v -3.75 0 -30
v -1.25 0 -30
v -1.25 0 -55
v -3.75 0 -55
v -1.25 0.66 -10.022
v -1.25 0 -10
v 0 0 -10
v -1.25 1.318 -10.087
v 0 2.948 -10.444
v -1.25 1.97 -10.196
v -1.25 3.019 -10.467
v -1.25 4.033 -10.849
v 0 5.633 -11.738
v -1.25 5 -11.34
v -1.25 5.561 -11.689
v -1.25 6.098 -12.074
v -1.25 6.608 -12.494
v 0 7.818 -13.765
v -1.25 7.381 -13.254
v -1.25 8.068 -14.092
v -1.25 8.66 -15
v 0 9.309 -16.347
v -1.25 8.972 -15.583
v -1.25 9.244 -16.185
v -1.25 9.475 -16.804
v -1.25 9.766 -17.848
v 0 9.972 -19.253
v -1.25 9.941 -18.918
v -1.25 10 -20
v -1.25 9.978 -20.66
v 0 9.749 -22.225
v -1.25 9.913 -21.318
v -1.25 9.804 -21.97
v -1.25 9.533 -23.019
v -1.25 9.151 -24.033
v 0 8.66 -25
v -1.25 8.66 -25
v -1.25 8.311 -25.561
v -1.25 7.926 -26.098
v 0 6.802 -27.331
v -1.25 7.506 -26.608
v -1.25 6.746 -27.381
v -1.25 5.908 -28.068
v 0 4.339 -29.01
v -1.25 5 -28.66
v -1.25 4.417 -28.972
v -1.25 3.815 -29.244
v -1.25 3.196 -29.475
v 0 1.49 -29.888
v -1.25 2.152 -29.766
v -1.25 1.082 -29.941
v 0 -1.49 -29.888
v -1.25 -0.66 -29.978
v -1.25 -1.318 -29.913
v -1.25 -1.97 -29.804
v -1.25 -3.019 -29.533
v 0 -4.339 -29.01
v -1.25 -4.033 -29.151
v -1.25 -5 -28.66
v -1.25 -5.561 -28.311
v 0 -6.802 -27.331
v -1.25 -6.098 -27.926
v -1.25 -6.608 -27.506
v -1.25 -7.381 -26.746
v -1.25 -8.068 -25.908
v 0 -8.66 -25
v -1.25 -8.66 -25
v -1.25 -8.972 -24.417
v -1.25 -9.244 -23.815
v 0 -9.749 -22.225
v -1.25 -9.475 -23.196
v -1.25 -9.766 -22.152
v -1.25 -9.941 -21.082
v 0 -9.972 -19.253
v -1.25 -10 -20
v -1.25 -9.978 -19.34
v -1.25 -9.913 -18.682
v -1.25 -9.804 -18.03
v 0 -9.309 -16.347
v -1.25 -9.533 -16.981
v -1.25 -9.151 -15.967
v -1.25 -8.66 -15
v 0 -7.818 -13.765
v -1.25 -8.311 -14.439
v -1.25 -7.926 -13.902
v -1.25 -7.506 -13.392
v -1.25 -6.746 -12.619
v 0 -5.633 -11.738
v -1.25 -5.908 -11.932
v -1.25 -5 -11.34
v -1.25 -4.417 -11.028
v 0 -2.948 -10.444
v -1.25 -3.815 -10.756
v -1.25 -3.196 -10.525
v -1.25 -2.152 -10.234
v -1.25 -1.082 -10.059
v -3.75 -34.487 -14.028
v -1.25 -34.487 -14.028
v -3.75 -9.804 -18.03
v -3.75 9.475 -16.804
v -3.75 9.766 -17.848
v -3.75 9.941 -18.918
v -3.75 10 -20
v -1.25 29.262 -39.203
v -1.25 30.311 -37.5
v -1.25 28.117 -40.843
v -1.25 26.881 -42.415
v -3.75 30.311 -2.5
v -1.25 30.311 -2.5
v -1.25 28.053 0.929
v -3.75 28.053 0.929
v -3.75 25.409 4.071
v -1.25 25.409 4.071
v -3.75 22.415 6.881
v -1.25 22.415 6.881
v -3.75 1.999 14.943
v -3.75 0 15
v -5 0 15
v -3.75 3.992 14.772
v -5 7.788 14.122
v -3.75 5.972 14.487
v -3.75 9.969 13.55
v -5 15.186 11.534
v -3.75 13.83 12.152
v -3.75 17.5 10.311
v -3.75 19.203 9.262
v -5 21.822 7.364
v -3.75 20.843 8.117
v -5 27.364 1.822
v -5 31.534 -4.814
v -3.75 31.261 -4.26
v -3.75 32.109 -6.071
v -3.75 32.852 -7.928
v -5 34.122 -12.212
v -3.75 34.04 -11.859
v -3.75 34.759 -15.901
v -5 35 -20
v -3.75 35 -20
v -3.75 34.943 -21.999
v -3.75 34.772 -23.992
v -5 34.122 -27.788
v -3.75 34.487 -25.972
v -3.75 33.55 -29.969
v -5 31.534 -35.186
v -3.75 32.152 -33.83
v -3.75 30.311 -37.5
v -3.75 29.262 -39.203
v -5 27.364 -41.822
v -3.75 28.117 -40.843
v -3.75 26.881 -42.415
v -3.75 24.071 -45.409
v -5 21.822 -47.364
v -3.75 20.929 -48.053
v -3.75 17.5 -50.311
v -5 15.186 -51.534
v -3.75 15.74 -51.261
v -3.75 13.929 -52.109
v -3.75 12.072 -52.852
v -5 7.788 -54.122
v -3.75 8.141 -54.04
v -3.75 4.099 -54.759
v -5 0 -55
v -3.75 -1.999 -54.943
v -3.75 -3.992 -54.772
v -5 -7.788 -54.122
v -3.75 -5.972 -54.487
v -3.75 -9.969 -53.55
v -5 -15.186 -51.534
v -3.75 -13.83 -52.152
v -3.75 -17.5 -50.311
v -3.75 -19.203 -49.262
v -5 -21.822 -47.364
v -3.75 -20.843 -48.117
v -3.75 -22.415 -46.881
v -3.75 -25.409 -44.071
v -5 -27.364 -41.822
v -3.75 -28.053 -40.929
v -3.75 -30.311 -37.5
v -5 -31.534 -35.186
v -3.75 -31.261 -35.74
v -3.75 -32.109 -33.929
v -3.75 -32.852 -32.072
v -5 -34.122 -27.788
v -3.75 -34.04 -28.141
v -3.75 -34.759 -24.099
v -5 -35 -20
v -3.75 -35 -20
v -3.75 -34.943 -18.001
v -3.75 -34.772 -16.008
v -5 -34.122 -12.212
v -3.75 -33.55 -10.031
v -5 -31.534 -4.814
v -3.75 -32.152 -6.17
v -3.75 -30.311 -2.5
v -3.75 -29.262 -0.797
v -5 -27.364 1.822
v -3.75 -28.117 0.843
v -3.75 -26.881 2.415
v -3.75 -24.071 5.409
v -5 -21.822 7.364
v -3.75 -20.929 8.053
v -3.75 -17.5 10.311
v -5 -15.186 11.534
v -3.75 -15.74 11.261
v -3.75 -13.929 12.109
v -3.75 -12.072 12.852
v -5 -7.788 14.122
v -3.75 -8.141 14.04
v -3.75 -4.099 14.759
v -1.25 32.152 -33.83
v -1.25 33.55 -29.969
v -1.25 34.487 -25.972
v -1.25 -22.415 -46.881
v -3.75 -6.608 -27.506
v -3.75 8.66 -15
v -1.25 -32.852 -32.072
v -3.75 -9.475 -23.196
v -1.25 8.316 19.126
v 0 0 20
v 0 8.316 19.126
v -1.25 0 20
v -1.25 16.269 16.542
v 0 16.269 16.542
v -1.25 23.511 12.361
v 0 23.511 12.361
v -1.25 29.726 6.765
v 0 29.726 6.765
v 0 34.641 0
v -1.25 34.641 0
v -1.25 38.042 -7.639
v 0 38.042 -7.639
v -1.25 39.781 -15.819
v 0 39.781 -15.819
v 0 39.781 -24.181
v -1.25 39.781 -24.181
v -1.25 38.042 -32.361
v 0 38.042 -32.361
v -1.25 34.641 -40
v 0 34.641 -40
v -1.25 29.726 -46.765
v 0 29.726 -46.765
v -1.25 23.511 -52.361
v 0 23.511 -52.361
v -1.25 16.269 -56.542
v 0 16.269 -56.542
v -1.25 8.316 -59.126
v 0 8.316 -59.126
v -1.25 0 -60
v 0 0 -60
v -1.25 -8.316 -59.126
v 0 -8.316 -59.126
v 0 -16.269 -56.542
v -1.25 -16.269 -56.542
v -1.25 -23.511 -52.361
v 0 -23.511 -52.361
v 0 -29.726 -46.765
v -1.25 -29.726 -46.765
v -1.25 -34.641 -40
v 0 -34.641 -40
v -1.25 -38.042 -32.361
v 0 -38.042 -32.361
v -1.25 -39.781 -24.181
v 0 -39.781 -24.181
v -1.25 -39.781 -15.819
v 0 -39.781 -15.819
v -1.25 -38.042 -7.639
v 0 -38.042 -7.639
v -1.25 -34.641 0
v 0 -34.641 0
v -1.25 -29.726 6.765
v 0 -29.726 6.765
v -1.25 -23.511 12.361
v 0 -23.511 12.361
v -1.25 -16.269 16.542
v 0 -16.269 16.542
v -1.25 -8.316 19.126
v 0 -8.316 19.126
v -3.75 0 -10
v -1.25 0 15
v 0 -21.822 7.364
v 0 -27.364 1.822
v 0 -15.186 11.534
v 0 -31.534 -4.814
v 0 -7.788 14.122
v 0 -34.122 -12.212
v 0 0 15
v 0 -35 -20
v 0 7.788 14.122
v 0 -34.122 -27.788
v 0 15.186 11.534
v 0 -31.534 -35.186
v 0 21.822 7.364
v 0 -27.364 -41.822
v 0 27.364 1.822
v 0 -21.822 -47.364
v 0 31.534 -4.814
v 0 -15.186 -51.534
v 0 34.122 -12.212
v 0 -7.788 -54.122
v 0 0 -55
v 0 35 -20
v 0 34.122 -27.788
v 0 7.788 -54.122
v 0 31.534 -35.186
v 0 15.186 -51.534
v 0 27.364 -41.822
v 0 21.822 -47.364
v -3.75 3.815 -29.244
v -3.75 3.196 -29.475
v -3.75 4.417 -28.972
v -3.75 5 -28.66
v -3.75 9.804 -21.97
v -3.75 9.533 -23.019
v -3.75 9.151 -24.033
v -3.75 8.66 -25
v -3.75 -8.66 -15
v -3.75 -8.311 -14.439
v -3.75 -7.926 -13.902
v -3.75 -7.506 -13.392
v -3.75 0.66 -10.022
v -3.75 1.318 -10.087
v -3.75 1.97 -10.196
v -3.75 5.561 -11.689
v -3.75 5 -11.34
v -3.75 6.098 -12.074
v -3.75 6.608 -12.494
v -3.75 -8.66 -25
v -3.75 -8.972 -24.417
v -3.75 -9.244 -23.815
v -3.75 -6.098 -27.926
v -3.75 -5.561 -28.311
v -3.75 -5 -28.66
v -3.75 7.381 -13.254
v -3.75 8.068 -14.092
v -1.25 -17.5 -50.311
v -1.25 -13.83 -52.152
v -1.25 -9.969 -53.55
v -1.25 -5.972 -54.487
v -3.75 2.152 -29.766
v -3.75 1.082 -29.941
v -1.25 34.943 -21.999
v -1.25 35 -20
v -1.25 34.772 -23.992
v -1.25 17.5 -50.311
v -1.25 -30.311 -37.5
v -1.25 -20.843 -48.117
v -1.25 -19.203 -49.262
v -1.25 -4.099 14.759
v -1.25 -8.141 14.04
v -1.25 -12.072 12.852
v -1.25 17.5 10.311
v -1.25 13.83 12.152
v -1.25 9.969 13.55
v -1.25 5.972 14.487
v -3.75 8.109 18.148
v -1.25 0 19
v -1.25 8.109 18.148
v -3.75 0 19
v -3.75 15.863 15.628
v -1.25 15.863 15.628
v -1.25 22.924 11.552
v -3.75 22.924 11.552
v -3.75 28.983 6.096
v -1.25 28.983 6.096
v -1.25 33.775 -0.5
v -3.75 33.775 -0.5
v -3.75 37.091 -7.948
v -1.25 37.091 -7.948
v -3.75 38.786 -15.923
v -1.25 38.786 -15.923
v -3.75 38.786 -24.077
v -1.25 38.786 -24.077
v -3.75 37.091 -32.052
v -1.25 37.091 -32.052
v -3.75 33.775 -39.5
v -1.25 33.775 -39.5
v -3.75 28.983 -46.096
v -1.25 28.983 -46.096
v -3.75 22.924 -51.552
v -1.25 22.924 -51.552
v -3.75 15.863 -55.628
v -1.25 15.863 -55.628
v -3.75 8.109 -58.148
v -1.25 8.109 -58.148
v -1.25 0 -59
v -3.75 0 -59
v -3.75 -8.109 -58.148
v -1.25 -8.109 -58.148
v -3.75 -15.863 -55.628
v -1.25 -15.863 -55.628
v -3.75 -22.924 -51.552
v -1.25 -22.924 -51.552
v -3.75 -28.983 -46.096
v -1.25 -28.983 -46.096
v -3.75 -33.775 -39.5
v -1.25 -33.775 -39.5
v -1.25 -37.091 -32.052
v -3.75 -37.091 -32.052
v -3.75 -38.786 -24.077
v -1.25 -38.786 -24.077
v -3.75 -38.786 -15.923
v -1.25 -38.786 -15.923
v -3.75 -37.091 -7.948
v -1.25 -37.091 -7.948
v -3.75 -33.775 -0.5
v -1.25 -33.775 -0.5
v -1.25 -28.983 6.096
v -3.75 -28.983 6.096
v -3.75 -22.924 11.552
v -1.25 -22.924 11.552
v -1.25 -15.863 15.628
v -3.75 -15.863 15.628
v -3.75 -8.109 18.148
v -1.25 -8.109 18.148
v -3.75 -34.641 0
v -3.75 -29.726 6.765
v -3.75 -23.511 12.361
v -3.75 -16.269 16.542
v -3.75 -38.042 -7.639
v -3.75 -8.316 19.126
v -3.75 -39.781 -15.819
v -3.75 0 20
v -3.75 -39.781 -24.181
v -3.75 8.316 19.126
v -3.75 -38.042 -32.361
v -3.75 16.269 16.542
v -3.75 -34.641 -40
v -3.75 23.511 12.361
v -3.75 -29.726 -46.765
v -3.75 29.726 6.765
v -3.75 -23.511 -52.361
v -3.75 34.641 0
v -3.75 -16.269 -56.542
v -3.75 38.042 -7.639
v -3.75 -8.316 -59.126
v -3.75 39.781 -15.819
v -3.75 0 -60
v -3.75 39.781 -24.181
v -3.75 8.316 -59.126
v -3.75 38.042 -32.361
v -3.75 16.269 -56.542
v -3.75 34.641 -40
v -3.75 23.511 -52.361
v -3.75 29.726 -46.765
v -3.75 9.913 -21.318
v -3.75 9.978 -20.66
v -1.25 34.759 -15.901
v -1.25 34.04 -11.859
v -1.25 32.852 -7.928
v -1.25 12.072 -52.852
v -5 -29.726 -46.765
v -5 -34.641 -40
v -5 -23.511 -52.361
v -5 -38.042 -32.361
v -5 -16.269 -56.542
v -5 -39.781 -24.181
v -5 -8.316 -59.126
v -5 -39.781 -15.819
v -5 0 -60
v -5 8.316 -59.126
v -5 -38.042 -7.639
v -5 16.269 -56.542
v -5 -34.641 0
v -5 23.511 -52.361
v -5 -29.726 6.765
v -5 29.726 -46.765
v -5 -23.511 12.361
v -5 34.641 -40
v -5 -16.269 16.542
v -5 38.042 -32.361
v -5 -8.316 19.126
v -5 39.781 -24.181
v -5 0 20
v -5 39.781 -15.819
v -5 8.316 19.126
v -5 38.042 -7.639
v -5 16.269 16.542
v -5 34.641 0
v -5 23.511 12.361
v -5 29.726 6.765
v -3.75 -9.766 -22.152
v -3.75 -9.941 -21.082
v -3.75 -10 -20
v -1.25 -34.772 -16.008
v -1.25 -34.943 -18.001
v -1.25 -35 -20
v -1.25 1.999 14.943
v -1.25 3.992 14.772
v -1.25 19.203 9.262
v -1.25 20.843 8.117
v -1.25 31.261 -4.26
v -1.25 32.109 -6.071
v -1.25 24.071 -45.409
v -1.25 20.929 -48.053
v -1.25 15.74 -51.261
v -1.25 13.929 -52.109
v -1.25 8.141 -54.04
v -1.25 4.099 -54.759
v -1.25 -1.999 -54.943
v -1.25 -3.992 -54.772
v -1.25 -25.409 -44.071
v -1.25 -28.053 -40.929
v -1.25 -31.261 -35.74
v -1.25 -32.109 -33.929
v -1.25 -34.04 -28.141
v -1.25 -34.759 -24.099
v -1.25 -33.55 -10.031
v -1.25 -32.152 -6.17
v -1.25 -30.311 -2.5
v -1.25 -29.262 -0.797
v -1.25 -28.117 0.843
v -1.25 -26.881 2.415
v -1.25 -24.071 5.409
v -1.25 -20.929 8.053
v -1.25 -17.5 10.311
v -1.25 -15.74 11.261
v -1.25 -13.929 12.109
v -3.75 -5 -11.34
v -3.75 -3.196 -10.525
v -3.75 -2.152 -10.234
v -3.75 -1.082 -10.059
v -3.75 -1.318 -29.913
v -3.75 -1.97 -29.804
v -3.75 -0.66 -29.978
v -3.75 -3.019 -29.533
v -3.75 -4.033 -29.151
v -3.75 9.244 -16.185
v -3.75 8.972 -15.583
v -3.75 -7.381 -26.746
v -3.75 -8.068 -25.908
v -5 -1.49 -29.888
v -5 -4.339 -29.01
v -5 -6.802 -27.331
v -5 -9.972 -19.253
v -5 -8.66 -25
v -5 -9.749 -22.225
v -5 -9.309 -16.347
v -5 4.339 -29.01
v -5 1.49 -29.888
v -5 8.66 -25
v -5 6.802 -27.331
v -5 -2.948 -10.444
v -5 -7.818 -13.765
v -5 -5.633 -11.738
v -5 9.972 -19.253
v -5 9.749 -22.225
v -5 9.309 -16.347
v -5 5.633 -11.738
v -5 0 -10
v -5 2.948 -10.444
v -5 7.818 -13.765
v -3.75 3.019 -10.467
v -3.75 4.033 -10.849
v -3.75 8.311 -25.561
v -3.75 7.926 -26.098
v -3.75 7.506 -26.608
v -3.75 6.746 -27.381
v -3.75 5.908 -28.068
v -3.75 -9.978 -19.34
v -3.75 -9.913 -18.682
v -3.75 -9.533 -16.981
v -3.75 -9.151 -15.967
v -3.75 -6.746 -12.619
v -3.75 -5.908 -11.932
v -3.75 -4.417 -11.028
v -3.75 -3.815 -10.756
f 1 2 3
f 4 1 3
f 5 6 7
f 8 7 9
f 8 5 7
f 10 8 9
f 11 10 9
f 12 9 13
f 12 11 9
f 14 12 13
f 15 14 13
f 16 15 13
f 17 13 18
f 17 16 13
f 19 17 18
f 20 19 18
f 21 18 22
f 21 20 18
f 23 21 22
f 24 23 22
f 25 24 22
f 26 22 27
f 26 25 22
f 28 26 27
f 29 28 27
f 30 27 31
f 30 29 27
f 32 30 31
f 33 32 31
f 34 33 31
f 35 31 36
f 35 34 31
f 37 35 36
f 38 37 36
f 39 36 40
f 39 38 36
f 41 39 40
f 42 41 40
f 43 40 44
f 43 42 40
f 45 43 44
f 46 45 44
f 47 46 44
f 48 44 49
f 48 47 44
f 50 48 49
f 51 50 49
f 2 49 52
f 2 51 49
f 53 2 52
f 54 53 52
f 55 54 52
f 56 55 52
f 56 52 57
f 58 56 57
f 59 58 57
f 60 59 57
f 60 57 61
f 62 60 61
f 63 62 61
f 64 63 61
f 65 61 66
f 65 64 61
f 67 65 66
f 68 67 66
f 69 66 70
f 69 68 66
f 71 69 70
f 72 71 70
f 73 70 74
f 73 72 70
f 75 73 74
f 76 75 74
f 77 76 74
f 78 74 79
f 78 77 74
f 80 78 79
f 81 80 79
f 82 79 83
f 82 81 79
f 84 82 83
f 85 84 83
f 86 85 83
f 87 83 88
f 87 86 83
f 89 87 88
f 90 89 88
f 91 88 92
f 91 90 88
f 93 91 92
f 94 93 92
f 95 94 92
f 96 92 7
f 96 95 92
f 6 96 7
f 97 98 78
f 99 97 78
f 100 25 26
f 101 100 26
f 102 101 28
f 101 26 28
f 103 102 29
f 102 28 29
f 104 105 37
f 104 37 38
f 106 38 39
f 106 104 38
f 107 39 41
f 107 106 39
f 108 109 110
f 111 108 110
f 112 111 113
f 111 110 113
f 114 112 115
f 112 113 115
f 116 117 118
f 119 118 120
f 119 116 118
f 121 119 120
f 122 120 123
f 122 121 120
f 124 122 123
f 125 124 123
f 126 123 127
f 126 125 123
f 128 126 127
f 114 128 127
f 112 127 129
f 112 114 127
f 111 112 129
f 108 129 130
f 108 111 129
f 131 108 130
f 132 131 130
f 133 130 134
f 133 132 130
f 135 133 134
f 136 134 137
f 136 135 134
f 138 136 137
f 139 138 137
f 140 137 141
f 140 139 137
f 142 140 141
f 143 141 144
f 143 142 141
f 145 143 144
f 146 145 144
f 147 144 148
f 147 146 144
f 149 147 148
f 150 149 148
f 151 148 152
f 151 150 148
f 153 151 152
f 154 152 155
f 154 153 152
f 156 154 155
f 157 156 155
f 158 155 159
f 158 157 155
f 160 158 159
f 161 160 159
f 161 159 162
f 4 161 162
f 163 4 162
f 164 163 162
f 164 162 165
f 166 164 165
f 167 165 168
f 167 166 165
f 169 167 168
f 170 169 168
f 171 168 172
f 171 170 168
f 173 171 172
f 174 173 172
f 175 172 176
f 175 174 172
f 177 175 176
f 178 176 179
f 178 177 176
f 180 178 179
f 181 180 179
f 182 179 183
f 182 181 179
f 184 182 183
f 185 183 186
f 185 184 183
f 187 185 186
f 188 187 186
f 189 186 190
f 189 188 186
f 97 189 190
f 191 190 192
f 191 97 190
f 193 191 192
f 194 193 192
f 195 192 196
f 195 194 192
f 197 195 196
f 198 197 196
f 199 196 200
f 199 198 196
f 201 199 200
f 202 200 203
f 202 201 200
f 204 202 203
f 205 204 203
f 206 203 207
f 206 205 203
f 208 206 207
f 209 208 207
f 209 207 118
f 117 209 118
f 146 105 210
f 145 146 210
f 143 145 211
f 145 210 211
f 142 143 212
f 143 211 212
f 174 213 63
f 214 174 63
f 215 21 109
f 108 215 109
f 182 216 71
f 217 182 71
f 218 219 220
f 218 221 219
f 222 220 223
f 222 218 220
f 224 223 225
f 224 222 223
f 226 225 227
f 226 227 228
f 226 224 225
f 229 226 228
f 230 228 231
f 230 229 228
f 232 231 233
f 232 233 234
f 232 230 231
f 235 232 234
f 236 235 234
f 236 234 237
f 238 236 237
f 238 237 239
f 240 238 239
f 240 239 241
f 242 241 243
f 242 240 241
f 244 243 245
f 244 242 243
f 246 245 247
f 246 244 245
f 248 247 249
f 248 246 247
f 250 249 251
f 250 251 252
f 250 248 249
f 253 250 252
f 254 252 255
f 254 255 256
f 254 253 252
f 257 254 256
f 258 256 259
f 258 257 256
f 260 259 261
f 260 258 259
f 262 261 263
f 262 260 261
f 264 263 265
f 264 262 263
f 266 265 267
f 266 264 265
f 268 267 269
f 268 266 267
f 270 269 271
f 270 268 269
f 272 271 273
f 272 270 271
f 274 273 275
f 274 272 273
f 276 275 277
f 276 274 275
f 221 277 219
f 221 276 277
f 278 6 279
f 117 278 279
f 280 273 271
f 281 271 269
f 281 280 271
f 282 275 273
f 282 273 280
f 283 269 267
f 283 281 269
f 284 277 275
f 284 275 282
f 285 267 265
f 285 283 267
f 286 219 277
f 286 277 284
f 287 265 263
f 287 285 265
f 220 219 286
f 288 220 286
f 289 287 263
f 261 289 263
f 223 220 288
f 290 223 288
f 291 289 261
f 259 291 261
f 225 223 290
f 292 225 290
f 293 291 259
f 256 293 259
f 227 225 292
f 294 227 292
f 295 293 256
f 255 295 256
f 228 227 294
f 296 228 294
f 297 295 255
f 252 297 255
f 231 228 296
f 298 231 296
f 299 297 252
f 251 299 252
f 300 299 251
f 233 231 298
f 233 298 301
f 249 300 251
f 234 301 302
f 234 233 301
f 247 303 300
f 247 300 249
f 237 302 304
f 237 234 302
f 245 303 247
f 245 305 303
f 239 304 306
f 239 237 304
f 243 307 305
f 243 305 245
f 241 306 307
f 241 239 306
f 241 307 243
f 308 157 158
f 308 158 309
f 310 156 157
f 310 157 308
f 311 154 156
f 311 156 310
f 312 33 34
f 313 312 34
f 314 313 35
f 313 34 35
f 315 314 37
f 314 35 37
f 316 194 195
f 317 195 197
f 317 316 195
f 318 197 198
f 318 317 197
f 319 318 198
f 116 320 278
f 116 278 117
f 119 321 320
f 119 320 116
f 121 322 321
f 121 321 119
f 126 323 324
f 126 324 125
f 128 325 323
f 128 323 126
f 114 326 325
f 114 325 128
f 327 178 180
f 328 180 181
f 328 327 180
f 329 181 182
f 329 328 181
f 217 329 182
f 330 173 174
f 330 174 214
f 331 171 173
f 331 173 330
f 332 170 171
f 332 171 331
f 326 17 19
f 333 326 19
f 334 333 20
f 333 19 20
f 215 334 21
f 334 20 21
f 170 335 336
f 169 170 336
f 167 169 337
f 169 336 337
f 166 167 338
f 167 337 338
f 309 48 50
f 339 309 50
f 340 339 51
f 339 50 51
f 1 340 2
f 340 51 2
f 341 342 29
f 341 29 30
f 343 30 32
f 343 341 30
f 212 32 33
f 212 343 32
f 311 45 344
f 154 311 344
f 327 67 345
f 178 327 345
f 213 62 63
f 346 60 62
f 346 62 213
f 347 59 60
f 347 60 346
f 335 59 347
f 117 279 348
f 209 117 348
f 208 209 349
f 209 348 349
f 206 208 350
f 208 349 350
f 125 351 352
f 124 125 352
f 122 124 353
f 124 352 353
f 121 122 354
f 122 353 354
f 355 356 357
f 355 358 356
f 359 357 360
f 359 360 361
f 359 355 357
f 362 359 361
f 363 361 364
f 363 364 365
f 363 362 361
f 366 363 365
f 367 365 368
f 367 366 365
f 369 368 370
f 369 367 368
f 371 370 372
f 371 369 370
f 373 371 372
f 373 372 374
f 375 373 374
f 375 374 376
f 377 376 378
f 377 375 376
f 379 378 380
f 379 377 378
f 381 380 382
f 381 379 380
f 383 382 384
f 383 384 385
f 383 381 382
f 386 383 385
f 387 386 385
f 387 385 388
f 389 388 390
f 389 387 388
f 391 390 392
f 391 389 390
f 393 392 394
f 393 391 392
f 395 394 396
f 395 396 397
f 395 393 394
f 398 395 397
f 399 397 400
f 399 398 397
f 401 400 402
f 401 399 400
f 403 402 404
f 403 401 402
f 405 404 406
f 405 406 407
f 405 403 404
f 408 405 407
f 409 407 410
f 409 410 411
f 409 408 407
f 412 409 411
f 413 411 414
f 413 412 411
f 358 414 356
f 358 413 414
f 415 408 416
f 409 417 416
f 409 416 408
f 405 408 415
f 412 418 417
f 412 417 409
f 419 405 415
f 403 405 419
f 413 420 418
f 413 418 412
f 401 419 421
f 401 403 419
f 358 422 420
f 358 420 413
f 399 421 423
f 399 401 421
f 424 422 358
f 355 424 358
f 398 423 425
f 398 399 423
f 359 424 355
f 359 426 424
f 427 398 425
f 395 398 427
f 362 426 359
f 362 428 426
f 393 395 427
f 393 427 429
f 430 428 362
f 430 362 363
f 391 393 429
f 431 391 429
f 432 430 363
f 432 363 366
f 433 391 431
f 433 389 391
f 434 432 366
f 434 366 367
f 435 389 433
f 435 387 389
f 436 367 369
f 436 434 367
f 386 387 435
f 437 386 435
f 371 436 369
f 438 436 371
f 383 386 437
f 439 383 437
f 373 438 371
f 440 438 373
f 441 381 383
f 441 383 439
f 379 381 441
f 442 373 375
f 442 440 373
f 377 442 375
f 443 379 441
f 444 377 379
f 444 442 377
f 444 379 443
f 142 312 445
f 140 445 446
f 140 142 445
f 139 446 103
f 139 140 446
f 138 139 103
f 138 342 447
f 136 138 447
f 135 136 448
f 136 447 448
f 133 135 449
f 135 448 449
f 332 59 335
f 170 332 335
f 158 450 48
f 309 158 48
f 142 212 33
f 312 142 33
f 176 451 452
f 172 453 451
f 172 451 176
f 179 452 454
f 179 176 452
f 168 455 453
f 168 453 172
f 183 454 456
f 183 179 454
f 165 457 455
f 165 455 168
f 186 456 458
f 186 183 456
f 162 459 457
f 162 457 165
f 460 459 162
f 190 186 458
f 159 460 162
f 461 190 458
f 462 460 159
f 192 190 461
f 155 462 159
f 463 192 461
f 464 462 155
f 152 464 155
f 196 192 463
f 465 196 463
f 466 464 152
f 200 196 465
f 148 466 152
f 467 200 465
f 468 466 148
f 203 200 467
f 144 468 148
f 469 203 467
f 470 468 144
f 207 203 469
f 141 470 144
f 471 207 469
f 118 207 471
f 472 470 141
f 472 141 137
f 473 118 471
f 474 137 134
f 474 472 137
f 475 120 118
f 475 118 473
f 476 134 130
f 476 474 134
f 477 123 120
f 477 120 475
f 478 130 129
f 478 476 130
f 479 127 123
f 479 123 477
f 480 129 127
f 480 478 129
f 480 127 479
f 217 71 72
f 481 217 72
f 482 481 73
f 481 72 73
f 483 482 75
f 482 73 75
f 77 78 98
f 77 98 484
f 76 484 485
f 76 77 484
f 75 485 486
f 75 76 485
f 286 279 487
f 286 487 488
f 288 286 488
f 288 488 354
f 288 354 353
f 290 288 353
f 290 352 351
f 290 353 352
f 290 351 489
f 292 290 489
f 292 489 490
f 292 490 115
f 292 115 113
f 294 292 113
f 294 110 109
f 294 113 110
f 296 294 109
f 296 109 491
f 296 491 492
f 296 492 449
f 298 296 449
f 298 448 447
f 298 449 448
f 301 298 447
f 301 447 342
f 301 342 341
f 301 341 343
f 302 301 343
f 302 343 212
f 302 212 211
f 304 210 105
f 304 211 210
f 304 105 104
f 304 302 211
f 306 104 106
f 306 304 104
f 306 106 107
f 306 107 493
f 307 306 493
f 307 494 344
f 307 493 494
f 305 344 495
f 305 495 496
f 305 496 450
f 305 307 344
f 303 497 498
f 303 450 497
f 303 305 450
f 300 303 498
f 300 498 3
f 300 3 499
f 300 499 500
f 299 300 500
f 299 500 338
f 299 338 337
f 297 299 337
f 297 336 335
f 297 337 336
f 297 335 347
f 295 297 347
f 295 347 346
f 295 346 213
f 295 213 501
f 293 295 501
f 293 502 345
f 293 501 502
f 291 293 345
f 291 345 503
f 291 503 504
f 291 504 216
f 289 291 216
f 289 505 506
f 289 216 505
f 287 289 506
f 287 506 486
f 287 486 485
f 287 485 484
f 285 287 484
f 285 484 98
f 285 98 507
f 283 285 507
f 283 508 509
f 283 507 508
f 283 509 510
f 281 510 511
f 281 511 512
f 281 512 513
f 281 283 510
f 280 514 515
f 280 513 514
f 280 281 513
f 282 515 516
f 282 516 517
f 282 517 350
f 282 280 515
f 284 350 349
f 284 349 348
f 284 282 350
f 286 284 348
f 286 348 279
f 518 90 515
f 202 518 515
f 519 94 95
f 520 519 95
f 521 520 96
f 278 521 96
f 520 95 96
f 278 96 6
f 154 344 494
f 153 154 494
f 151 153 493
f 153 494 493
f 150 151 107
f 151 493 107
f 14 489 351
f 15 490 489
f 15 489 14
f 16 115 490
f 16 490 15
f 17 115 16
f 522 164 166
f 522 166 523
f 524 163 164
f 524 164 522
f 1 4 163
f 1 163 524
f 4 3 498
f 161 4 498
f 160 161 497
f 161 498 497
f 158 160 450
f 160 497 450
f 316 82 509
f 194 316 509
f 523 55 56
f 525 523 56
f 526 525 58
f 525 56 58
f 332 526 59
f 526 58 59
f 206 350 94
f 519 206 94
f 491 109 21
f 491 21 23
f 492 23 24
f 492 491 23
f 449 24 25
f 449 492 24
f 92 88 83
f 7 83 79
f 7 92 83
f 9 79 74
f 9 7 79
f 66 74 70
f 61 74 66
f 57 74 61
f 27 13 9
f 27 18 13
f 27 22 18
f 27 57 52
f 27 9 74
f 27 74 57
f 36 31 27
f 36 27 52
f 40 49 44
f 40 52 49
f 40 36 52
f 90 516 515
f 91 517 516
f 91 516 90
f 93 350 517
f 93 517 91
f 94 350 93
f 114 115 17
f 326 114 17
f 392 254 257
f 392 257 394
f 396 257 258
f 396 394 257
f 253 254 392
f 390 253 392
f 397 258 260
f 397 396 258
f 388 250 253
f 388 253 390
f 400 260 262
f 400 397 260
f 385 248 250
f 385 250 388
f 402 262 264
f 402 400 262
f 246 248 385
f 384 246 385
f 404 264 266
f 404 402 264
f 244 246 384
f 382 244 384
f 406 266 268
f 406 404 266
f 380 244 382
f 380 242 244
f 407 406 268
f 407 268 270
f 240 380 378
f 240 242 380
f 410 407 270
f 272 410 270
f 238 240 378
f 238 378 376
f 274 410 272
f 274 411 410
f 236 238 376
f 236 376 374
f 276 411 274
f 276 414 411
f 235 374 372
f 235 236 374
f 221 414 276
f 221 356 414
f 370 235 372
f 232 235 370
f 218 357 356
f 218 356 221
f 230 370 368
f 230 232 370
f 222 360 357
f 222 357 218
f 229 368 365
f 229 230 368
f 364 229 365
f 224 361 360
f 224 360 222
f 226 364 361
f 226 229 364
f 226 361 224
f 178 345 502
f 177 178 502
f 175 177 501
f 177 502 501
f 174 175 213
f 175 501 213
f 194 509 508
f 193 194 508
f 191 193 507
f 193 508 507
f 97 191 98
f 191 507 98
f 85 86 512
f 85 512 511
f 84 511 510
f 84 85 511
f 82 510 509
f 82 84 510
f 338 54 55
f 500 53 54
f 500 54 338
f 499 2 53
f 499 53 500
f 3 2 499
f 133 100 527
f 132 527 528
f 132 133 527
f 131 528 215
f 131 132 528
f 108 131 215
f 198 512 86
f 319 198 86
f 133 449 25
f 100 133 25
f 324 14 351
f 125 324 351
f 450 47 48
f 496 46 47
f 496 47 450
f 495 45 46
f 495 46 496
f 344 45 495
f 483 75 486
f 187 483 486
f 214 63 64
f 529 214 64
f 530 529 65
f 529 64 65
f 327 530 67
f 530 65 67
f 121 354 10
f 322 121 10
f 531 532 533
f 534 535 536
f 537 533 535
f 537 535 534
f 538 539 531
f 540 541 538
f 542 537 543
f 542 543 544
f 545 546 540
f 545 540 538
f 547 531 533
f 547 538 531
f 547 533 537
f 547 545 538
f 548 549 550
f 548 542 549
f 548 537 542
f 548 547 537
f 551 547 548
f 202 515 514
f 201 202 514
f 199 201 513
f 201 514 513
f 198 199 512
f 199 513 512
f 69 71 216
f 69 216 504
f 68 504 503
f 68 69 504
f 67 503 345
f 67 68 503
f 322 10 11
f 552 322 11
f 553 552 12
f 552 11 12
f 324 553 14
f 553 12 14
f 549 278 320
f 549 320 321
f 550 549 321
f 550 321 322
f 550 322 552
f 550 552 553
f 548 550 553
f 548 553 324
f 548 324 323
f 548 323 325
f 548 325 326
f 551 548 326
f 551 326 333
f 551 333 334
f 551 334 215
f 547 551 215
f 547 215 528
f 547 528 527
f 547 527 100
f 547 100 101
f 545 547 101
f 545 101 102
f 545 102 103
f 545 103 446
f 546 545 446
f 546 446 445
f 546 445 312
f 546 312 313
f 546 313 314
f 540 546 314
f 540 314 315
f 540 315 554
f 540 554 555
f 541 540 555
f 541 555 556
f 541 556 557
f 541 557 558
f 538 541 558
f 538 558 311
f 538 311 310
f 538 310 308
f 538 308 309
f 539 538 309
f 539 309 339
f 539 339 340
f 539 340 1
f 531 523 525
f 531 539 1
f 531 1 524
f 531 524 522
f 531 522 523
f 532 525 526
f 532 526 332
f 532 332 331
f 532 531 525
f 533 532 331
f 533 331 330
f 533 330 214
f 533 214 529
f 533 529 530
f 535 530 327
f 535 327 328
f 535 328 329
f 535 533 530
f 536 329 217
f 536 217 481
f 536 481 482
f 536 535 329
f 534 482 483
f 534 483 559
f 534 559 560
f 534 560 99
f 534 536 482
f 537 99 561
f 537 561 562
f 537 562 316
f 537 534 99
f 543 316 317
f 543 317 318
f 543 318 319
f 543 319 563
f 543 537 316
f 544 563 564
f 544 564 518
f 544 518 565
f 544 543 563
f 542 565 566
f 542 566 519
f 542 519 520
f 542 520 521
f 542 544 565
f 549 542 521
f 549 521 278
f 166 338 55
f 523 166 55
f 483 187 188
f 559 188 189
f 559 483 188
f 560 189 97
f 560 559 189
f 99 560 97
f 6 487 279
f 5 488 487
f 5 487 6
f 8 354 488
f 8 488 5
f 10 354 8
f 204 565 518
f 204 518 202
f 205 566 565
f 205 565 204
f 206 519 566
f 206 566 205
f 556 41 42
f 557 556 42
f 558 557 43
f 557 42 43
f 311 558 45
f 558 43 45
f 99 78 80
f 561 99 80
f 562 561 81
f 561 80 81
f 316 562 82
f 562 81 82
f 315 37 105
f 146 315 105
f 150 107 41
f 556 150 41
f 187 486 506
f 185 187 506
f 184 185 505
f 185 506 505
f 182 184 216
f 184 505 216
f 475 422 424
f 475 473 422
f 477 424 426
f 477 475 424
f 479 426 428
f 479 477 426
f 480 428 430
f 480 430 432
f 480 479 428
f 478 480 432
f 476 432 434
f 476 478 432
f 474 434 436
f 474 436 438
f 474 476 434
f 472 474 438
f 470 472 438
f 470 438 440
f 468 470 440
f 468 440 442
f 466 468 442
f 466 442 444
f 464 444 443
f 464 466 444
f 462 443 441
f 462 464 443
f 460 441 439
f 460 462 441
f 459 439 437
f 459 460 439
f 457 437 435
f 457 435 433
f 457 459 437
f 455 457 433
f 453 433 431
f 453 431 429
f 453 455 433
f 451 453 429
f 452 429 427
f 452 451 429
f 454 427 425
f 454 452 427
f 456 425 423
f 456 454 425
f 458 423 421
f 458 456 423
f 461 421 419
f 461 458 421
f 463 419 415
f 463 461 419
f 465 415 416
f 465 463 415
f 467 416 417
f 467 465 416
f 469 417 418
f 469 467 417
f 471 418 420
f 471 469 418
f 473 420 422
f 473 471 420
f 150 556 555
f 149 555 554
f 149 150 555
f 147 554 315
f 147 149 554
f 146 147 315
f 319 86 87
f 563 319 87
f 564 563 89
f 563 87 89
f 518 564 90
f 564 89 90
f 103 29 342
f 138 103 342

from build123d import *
from build123d import SkipClean  # not in build123d's __all__

# Parameters (mm, degrees)
F3_DEPTH        = 2.5
F3_COPIES_COUNT = 12


# Not quite as in the source:
# - after a boolean that leaves OpenCascade's solid faulty, fix() repairs it
# - a pattern or mirror of a feature is missing from the dataset's text; its kind, count and spacing are read off the source's solid


with BuildPart() as f1:
    # F0 (on Front) → F1 (revolve)
    with BuildSketch(Plane.XZ):
        Polygon((-5, -20), (0, -20), (0, -10), (-1.25, -10), (-1.25, 15), (0, 15), (0, 20), (-1.25, 20), (-1.25, 19), (-3.75, 19), (-3.75, 20), (-5, 20), (-5, 15), (-3.75, 15), (-3.75, -10), (-5, -10), align=None)
    revolve(axis=Axis((-2.5, 0, -20), (-1, 0, 0)))

    # F2 (on face) → F3 (cut, through all)
    with BuildSketch(Plane.YZ.offset(-1.25)):
        with BuildLine():
            Line((0, -10), (0, 15))
            ThreePointArc((0, 15), (-6.1307239653, 14.4588772838), (-12.0718779875, 12.8522413521))
            Line((-12.0718779875, 12.8522413521), (-3.1961564517, -10.5245272447))
            ThreePointArc((-3.1961564517, -10.5245272447), (-1.6194555331, -10.1320030515), (0, -10))
        make_face()
    with SkipClean():  # cleaning this boolean's faces spoils the solid; the shape is the same uncleaned
        f3 = extrude(amount=-F3_DEPTH, mode=Mode.SUBTRACT)

    # F3_copies: F3 ×12 about axis
    f3_copies_axis = Axis((0, 0, -20), (1, 0, 0))
    for i in range(1, F3_COPIES_COUNT):
        add(f3.rotate(f3_copies_axis, i * 360 / F3_COPIES_COUNT), clean=False, mode=Mode.SUBTRACT)

    add(f1.part.fix(), mode=Mode.REPLACE)


solid = f1.part
